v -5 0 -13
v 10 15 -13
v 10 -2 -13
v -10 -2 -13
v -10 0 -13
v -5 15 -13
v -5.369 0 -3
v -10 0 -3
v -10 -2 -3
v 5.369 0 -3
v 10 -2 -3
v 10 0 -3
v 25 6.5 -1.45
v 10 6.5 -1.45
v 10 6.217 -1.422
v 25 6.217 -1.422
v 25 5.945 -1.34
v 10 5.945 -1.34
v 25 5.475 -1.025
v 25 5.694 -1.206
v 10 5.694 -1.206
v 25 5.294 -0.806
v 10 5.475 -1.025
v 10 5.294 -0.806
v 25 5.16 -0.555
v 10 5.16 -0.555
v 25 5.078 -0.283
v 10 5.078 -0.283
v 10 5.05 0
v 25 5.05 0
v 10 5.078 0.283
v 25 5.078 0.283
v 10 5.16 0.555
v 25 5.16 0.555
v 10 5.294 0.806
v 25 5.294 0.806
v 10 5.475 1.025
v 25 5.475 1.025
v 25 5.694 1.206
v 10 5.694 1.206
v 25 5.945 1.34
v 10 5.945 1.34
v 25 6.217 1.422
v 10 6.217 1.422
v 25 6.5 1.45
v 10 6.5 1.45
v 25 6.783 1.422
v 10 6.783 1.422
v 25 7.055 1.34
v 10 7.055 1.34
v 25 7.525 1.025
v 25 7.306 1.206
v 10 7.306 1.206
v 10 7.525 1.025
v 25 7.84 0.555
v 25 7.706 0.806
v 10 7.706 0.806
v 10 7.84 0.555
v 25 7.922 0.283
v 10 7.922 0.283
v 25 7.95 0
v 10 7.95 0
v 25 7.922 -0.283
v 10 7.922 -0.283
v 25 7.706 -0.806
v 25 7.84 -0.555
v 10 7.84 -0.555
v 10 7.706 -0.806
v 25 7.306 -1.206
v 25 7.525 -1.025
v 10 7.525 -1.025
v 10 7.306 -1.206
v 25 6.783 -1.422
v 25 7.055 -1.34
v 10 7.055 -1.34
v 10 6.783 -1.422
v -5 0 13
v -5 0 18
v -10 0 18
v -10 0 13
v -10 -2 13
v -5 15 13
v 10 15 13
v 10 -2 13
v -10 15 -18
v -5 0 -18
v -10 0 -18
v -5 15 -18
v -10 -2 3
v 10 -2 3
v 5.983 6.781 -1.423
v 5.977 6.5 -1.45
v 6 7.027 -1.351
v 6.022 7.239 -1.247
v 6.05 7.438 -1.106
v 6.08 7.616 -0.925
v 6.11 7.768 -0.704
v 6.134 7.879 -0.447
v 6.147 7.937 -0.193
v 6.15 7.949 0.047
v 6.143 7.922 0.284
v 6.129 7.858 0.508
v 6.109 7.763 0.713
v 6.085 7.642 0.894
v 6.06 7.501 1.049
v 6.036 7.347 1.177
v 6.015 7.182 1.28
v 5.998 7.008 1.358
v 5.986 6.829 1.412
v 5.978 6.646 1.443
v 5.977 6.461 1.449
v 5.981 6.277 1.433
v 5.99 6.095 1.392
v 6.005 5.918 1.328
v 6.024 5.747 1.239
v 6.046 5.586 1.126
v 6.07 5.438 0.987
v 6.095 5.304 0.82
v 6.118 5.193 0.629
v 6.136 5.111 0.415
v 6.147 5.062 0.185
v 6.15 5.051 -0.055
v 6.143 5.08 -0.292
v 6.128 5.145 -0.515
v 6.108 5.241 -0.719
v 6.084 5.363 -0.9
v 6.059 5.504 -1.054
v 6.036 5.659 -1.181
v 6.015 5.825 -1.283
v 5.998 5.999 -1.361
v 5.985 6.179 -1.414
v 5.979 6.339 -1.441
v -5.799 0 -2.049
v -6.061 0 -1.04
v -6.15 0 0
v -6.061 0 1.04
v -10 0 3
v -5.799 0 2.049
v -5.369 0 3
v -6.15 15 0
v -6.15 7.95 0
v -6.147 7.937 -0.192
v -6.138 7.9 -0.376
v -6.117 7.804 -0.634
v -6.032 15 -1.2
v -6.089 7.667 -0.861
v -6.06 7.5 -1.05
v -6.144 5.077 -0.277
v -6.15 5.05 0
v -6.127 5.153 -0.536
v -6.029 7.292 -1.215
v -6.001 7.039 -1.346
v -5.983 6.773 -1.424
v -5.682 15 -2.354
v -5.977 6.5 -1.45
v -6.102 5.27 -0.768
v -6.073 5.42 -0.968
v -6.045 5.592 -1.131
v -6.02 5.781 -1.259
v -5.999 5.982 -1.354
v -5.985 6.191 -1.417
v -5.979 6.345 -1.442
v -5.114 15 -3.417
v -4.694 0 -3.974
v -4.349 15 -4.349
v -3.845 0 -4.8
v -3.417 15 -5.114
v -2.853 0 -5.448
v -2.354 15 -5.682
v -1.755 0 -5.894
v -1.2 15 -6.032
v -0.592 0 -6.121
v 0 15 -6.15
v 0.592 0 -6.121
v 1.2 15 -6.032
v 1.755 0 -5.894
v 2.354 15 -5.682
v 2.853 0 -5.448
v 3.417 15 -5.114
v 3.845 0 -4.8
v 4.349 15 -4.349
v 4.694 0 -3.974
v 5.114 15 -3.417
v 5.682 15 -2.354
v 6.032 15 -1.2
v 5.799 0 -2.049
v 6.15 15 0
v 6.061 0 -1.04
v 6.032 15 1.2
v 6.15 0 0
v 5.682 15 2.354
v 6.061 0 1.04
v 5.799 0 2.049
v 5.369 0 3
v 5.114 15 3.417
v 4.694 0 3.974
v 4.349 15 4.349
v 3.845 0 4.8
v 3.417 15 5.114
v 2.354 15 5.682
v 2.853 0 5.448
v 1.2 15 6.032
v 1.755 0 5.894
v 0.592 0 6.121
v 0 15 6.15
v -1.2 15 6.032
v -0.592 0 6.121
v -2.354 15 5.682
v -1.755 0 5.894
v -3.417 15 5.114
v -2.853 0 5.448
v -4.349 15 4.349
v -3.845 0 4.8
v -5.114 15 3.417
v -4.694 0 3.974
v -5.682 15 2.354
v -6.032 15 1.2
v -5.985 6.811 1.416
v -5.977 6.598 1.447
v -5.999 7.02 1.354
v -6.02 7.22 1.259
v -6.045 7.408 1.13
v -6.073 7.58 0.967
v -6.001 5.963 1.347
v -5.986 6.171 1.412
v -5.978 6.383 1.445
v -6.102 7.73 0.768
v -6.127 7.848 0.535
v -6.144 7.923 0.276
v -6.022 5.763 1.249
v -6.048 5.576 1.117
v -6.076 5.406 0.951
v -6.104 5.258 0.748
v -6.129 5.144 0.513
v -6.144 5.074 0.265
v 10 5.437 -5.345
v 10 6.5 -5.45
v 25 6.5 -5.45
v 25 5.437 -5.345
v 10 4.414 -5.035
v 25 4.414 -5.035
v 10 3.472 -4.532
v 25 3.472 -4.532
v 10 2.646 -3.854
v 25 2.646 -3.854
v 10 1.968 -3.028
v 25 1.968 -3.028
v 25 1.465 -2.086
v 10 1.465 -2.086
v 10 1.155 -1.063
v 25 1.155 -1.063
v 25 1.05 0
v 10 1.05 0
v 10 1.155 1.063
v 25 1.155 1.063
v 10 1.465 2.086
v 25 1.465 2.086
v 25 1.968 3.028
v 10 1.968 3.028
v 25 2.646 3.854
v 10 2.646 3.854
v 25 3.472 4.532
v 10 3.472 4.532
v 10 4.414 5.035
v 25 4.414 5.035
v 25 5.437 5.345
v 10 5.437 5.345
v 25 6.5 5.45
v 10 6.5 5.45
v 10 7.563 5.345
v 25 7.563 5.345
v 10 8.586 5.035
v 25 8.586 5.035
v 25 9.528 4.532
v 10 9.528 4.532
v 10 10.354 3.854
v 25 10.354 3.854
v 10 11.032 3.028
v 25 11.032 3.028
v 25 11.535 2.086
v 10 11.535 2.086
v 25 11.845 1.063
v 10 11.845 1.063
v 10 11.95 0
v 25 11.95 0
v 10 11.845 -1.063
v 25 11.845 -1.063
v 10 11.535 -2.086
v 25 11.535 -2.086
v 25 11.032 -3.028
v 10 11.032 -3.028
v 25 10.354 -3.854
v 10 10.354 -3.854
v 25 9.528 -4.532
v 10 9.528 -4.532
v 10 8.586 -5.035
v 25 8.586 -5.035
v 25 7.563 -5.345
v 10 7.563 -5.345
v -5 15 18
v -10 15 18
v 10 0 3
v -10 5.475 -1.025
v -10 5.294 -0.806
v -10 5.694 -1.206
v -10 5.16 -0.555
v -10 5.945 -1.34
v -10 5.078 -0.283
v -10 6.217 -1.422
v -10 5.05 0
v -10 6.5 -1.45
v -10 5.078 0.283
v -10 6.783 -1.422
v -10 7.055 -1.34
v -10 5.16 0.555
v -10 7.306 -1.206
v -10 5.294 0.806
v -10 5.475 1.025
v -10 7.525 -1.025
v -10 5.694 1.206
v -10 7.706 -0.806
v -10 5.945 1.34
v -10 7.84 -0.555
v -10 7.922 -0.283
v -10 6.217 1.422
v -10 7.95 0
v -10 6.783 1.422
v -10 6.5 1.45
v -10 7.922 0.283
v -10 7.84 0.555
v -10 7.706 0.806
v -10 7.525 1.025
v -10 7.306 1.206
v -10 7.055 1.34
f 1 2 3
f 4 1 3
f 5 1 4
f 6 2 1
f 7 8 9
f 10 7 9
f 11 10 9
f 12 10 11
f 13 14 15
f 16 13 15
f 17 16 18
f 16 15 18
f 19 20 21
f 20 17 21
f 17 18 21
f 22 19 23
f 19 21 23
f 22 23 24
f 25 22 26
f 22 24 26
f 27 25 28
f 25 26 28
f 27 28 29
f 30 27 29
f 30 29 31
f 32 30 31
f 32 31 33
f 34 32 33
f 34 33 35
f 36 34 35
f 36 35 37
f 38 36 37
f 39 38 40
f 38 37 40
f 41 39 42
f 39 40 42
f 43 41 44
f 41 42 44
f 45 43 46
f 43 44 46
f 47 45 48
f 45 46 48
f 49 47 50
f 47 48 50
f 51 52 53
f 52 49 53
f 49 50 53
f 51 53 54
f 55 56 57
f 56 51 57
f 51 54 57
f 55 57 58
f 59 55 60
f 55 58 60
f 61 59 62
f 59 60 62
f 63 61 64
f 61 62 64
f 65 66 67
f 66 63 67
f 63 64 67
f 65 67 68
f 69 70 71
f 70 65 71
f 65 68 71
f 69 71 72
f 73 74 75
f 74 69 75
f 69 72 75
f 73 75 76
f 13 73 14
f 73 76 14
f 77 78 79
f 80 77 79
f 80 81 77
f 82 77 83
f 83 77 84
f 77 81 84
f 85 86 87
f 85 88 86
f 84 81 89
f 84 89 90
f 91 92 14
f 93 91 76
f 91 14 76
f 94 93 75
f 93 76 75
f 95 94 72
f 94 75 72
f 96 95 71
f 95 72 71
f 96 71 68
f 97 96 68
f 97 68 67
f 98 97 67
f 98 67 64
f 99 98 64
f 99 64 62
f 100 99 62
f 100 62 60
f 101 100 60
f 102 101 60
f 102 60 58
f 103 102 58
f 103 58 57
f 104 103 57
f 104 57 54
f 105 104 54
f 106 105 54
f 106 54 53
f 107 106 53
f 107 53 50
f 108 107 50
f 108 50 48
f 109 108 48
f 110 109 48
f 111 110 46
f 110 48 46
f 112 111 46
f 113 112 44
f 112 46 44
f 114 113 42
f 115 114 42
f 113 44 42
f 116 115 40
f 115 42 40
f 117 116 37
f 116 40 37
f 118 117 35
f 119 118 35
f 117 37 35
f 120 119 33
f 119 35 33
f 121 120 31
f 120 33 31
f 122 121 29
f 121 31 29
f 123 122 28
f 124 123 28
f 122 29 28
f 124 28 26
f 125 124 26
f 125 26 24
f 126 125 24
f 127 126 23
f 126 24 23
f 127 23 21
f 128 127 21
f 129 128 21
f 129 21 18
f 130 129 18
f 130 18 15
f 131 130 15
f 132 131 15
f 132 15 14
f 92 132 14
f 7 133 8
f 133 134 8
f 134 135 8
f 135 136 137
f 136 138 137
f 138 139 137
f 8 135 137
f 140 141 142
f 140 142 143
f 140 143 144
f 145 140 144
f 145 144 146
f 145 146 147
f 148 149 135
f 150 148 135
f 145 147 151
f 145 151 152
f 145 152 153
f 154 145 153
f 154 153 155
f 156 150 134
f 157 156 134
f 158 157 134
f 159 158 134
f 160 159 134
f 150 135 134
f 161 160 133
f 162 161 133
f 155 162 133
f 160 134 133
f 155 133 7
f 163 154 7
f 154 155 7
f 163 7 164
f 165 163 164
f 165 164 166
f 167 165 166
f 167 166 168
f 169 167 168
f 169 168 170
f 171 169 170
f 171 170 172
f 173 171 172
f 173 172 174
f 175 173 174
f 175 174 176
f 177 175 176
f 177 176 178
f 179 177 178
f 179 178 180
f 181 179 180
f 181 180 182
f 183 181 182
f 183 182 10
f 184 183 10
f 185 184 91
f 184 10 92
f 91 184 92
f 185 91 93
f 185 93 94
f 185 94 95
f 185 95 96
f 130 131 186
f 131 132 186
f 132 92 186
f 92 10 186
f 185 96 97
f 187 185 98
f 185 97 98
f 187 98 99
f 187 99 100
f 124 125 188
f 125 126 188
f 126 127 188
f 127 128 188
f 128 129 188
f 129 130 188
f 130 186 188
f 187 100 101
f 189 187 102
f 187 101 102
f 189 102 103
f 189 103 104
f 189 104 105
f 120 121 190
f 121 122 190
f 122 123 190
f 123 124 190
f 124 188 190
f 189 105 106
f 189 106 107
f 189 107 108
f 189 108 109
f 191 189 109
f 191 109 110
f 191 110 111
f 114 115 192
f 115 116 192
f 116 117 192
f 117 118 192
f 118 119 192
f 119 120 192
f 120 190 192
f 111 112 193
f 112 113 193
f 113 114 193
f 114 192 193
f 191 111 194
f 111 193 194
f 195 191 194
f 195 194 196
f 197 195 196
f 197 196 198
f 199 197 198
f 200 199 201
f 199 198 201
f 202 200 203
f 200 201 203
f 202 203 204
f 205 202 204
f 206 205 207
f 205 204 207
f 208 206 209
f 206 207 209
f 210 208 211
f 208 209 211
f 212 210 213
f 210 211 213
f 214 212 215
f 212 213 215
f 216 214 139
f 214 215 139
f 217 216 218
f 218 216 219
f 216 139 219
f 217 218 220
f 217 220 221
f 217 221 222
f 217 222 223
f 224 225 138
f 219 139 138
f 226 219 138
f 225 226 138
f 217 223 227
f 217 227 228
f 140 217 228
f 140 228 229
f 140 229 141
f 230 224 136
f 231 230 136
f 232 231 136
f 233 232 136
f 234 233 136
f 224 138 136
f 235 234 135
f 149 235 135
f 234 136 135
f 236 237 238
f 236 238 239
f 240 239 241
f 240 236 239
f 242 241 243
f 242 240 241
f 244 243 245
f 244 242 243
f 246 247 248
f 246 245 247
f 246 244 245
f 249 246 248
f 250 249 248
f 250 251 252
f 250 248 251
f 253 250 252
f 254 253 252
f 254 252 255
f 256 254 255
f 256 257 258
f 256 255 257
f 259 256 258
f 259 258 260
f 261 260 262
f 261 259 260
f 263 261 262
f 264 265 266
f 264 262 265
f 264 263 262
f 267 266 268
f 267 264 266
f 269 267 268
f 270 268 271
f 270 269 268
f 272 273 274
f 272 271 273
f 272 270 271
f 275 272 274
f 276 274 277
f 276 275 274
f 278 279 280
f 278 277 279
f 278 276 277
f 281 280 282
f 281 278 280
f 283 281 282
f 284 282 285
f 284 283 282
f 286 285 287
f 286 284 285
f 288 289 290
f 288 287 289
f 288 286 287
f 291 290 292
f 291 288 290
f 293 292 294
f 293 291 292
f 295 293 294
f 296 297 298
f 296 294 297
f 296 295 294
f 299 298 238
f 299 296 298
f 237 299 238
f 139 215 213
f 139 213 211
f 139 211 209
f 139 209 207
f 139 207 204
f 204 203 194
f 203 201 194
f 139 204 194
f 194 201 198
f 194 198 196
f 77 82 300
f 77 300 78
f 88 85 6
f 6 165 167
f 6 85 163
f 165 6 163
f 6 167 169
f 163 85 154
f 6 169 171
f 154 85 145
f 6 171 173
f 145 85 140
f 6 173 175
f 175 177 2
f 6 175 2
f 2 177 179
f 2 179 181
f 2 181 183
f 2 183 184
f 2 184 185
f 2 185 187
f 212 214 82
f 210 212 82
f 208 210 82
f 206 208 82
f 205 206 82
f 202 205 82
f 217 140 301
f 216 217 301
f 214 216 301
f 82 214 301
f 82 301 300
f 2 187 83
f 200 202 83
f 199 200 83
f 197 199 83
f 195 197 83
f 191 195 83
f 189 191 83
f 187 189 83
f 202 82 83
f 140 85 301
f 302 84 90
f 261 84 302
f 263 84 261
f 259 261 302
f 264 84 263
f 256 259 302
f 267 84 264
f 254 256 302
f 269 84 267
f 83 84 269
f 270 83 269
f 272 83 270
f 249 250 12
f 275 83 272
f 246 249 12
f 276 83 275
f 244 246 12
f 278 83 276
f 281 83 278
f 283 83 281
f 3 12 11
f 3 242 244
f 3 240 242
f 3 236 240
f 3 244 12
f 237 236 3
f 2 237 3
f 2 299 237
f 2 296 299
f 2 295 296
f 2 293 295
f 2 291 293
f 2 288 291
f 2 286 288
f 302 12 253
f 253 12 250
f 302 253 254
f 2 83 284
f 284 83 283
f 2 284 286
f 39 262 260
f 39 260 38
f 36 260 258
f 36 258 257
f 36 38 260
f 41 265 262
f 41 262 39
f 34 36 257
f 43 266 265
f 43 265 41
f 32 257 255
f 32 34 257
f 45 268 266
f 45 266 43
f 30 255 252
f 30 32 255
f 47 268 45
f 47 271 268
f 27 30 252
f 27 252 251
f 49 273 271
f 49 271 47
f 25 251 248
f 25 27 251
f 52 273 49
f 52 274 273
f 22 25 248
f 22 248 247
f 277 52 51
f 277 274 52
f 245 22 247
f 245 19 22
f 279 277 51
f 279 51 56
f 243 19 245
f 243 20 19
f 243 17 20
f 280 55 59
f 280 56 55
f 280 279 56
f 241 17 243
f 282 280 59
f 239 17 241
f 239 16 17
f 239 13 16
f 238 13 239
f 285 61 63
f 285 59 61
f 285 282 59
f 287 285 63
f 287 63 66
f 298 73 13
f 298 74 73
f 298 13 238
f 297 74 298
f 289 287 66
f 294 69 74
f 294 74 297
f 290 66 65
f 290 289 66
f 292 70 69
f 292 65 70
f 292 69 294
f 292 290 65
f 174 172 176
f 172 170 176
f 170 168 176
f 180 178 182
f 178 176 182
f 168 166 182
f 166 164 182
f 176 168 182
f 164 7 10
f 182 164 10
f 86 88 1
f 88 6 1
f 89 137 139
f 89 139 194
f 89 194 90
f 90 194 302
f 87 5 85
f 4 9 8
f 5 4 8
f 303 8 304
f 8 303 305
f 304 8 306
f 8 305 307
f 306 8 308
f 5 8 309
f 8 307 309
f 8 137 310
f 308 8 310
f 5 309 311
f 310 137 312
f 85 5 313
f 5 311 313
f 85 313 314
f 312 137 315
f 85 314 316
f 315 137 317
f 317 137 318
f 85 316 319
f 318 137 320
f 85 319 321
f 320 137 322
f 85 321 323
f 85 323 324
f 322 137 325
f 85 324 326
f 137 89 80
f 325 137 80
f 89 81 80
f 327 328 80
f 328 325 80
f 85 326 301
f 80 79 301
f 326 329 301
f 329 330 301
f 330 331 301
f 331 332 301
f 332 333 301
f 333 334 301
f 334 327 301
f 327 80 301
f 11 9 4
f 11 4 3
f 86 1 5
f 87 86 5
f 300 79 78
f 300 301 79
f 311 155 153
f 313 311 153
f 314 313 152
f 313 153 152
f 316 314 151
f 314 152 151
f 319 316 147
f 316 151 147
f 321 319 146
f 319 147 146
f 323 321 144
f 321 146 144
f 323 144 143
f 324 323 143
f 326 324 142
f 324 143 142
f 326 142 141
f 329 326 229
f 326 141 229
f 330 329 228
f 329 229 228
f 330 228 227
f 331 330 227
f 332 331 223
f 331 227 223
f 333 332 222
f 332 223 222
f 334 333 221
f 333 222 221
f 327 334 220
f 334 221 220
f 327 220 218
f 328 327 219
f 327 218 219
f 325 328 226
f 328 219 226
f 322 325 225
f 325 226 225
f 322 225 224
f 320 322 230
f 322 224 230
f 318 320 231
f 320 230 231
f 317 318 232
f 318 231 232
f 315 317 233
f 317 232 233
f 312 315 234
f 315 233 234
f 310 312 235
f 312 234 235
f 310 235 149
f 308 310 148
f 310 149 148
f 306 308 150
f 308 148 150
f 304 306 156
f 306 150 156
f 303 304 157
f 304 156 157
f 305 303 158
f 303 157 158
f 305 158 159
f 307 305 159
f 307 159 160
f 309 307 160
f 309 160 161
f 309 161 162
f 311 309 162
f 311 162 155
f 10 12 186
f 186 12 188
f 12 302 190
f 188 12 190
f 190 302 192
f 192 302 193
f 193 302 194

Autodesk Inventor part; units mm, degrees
ref_plane "YZ Plane" through (0, 0, 0) normal (1, 0, 0) x (0, 1, 0)
ref_plane "XZ Plane" through (0, 0, 0) normal (0, 1, 0) x (-1, 0, 0)
ref_plane "XY Plane" through (0, 0, 0) normal (0, 0, 1) x (1, 0, 0)
sketch "Sketch1" plane through (0, 0, 0) normal (0, 1, 0) x (-1, 0, 0)
  circle A0 centre (0, 0) radius 6.15
  line L0 (10, 13) -> (-10, 13)
  line L1 (-10, 13) -> (-10, -13)
  line L2 (-10, -13) -> (10, -13)
  line L3 (10, -13) -> (10, 13)
  dimension "d0" = 12.3
  dimension "d1" = 10
  dimension "d2" = 10
  dimension "d3" = 13
  dimension "d4" = 13
extrude "Extrusion1" add sketch "Sketch1" along normal blind 15
sketch "Sketch2" plane through (10, 0, 13) normal (1, 0, 0) x (0, 0, -1)
  circle A0 centre (13, 6.5) radius 1.45
  line L0 (0, 0) -> (26, 0) projected
  line L1 (0, 0) -> (0, 15) projected
  point P0 (13, 0)
  dimension "d7" = 2.9
  dimension "d8" = 6.5
  dimension "d11" = 13
extrude "Extrusion2" cut sketch "Sketch2" against normal blind 55
sketch "Sketch3" plane through (10, 0, 13) normal (1, 0, 0) x (0, 0, -1)
  circle A0 centre (13, 6.5) radius 1.45 projected
  line L0 (0, 0) -> (26, 0) projected
  line L1 (26, 0) -> (26, 15) projected
  line L2 (0, 15) -> (26, 15) projected
  line L3 (0, 0) -> (0, 15) projected
  circle A1 centre (13, 6.5) radius 5.45
  circle A2 centre (4, 6.5) radius 1.6
  circle A3 centre (22, 6.5) radius 1.6
  point P0 (13, 0)
  dimension "d16" = 4
  dimension "d21" = 3.2
  dimension "d22" = 3.2
  dimension "d23" = 4
  dimension "d24" = 4
extrude "Extrusion3" add sketch "Sketch3" along normal blind 15 contours A1
sketch "Sketch6" plane through (-10, 0, 13) normal (0, 0, 1) x (1, 0, 0)
  line L0 (0, 0) -> (0, 15) projected
  line L1 (0, 15) -> (5, 15)
  line L2 (5, 15) -> (5, 0)
  line L3 (5, 0) -> (0, 0)
  line L4 (0, 0) -> (0, 15)
  point P0 (10, 0)
  dimension "d31" = 5
extrude "Extrusion6" add sketch "Sketch6" along normal blind 5
sketch "Sketch7" plane through (10, 0, -13) normal (0, 0, -1) x (-1, 0, 0)
  line L0 (20, 0) -> (20, 15) projected
  line L1 (20, 15) -> (15, 15)
  line L2 (15, 15) -> (15, 0)
  line L3 (15, 0) -> (20, 0)
  line L4 (20, 0) -> (20, 15)
  point P0 (10, 0)
  dimension "d34" = 5
extrude "Extrusion7" add sketch "Sketch7" along normal blind 5
sketch "Sketch8" plane through (0, 0, 0) normal (0, -1, 0) x (1, 0, 0)
  line L0 (10, 13) -> (10, -13) projected
  line L1 (-10, 18) -> (-10, -18) projected
  line L2 (10, 13) -> (-10, 13)
  line L3 (-10, 13) -> (-10, 3)
  line L4 (-10, 3) -> (10, 3)
  line L5 (10, 3) -> (10, 13)
  line L6 (10, -13) -> (-5, -13) projected
  line L7 (10, -13) -> (-10, -13)
  line L8 (-10, -13) -> (-10, -3)
  line L9 (-10, -3) -> (10, -3)
  line L10 (10, -3) -> (10, -13)
  point P0 (0, 0)
  point P1 (10, -3)
  point P2 (-10, -3)
  dimension "d37" = 10
  dimension "d38" = 10
extrude "Extrusion8" add sketch "Sketch8" along normal blind 2 contours L0 L4 L1 L2 | L0 L6 L7 L1 L9
properties part number "Tube_innerhole_template_p1"
